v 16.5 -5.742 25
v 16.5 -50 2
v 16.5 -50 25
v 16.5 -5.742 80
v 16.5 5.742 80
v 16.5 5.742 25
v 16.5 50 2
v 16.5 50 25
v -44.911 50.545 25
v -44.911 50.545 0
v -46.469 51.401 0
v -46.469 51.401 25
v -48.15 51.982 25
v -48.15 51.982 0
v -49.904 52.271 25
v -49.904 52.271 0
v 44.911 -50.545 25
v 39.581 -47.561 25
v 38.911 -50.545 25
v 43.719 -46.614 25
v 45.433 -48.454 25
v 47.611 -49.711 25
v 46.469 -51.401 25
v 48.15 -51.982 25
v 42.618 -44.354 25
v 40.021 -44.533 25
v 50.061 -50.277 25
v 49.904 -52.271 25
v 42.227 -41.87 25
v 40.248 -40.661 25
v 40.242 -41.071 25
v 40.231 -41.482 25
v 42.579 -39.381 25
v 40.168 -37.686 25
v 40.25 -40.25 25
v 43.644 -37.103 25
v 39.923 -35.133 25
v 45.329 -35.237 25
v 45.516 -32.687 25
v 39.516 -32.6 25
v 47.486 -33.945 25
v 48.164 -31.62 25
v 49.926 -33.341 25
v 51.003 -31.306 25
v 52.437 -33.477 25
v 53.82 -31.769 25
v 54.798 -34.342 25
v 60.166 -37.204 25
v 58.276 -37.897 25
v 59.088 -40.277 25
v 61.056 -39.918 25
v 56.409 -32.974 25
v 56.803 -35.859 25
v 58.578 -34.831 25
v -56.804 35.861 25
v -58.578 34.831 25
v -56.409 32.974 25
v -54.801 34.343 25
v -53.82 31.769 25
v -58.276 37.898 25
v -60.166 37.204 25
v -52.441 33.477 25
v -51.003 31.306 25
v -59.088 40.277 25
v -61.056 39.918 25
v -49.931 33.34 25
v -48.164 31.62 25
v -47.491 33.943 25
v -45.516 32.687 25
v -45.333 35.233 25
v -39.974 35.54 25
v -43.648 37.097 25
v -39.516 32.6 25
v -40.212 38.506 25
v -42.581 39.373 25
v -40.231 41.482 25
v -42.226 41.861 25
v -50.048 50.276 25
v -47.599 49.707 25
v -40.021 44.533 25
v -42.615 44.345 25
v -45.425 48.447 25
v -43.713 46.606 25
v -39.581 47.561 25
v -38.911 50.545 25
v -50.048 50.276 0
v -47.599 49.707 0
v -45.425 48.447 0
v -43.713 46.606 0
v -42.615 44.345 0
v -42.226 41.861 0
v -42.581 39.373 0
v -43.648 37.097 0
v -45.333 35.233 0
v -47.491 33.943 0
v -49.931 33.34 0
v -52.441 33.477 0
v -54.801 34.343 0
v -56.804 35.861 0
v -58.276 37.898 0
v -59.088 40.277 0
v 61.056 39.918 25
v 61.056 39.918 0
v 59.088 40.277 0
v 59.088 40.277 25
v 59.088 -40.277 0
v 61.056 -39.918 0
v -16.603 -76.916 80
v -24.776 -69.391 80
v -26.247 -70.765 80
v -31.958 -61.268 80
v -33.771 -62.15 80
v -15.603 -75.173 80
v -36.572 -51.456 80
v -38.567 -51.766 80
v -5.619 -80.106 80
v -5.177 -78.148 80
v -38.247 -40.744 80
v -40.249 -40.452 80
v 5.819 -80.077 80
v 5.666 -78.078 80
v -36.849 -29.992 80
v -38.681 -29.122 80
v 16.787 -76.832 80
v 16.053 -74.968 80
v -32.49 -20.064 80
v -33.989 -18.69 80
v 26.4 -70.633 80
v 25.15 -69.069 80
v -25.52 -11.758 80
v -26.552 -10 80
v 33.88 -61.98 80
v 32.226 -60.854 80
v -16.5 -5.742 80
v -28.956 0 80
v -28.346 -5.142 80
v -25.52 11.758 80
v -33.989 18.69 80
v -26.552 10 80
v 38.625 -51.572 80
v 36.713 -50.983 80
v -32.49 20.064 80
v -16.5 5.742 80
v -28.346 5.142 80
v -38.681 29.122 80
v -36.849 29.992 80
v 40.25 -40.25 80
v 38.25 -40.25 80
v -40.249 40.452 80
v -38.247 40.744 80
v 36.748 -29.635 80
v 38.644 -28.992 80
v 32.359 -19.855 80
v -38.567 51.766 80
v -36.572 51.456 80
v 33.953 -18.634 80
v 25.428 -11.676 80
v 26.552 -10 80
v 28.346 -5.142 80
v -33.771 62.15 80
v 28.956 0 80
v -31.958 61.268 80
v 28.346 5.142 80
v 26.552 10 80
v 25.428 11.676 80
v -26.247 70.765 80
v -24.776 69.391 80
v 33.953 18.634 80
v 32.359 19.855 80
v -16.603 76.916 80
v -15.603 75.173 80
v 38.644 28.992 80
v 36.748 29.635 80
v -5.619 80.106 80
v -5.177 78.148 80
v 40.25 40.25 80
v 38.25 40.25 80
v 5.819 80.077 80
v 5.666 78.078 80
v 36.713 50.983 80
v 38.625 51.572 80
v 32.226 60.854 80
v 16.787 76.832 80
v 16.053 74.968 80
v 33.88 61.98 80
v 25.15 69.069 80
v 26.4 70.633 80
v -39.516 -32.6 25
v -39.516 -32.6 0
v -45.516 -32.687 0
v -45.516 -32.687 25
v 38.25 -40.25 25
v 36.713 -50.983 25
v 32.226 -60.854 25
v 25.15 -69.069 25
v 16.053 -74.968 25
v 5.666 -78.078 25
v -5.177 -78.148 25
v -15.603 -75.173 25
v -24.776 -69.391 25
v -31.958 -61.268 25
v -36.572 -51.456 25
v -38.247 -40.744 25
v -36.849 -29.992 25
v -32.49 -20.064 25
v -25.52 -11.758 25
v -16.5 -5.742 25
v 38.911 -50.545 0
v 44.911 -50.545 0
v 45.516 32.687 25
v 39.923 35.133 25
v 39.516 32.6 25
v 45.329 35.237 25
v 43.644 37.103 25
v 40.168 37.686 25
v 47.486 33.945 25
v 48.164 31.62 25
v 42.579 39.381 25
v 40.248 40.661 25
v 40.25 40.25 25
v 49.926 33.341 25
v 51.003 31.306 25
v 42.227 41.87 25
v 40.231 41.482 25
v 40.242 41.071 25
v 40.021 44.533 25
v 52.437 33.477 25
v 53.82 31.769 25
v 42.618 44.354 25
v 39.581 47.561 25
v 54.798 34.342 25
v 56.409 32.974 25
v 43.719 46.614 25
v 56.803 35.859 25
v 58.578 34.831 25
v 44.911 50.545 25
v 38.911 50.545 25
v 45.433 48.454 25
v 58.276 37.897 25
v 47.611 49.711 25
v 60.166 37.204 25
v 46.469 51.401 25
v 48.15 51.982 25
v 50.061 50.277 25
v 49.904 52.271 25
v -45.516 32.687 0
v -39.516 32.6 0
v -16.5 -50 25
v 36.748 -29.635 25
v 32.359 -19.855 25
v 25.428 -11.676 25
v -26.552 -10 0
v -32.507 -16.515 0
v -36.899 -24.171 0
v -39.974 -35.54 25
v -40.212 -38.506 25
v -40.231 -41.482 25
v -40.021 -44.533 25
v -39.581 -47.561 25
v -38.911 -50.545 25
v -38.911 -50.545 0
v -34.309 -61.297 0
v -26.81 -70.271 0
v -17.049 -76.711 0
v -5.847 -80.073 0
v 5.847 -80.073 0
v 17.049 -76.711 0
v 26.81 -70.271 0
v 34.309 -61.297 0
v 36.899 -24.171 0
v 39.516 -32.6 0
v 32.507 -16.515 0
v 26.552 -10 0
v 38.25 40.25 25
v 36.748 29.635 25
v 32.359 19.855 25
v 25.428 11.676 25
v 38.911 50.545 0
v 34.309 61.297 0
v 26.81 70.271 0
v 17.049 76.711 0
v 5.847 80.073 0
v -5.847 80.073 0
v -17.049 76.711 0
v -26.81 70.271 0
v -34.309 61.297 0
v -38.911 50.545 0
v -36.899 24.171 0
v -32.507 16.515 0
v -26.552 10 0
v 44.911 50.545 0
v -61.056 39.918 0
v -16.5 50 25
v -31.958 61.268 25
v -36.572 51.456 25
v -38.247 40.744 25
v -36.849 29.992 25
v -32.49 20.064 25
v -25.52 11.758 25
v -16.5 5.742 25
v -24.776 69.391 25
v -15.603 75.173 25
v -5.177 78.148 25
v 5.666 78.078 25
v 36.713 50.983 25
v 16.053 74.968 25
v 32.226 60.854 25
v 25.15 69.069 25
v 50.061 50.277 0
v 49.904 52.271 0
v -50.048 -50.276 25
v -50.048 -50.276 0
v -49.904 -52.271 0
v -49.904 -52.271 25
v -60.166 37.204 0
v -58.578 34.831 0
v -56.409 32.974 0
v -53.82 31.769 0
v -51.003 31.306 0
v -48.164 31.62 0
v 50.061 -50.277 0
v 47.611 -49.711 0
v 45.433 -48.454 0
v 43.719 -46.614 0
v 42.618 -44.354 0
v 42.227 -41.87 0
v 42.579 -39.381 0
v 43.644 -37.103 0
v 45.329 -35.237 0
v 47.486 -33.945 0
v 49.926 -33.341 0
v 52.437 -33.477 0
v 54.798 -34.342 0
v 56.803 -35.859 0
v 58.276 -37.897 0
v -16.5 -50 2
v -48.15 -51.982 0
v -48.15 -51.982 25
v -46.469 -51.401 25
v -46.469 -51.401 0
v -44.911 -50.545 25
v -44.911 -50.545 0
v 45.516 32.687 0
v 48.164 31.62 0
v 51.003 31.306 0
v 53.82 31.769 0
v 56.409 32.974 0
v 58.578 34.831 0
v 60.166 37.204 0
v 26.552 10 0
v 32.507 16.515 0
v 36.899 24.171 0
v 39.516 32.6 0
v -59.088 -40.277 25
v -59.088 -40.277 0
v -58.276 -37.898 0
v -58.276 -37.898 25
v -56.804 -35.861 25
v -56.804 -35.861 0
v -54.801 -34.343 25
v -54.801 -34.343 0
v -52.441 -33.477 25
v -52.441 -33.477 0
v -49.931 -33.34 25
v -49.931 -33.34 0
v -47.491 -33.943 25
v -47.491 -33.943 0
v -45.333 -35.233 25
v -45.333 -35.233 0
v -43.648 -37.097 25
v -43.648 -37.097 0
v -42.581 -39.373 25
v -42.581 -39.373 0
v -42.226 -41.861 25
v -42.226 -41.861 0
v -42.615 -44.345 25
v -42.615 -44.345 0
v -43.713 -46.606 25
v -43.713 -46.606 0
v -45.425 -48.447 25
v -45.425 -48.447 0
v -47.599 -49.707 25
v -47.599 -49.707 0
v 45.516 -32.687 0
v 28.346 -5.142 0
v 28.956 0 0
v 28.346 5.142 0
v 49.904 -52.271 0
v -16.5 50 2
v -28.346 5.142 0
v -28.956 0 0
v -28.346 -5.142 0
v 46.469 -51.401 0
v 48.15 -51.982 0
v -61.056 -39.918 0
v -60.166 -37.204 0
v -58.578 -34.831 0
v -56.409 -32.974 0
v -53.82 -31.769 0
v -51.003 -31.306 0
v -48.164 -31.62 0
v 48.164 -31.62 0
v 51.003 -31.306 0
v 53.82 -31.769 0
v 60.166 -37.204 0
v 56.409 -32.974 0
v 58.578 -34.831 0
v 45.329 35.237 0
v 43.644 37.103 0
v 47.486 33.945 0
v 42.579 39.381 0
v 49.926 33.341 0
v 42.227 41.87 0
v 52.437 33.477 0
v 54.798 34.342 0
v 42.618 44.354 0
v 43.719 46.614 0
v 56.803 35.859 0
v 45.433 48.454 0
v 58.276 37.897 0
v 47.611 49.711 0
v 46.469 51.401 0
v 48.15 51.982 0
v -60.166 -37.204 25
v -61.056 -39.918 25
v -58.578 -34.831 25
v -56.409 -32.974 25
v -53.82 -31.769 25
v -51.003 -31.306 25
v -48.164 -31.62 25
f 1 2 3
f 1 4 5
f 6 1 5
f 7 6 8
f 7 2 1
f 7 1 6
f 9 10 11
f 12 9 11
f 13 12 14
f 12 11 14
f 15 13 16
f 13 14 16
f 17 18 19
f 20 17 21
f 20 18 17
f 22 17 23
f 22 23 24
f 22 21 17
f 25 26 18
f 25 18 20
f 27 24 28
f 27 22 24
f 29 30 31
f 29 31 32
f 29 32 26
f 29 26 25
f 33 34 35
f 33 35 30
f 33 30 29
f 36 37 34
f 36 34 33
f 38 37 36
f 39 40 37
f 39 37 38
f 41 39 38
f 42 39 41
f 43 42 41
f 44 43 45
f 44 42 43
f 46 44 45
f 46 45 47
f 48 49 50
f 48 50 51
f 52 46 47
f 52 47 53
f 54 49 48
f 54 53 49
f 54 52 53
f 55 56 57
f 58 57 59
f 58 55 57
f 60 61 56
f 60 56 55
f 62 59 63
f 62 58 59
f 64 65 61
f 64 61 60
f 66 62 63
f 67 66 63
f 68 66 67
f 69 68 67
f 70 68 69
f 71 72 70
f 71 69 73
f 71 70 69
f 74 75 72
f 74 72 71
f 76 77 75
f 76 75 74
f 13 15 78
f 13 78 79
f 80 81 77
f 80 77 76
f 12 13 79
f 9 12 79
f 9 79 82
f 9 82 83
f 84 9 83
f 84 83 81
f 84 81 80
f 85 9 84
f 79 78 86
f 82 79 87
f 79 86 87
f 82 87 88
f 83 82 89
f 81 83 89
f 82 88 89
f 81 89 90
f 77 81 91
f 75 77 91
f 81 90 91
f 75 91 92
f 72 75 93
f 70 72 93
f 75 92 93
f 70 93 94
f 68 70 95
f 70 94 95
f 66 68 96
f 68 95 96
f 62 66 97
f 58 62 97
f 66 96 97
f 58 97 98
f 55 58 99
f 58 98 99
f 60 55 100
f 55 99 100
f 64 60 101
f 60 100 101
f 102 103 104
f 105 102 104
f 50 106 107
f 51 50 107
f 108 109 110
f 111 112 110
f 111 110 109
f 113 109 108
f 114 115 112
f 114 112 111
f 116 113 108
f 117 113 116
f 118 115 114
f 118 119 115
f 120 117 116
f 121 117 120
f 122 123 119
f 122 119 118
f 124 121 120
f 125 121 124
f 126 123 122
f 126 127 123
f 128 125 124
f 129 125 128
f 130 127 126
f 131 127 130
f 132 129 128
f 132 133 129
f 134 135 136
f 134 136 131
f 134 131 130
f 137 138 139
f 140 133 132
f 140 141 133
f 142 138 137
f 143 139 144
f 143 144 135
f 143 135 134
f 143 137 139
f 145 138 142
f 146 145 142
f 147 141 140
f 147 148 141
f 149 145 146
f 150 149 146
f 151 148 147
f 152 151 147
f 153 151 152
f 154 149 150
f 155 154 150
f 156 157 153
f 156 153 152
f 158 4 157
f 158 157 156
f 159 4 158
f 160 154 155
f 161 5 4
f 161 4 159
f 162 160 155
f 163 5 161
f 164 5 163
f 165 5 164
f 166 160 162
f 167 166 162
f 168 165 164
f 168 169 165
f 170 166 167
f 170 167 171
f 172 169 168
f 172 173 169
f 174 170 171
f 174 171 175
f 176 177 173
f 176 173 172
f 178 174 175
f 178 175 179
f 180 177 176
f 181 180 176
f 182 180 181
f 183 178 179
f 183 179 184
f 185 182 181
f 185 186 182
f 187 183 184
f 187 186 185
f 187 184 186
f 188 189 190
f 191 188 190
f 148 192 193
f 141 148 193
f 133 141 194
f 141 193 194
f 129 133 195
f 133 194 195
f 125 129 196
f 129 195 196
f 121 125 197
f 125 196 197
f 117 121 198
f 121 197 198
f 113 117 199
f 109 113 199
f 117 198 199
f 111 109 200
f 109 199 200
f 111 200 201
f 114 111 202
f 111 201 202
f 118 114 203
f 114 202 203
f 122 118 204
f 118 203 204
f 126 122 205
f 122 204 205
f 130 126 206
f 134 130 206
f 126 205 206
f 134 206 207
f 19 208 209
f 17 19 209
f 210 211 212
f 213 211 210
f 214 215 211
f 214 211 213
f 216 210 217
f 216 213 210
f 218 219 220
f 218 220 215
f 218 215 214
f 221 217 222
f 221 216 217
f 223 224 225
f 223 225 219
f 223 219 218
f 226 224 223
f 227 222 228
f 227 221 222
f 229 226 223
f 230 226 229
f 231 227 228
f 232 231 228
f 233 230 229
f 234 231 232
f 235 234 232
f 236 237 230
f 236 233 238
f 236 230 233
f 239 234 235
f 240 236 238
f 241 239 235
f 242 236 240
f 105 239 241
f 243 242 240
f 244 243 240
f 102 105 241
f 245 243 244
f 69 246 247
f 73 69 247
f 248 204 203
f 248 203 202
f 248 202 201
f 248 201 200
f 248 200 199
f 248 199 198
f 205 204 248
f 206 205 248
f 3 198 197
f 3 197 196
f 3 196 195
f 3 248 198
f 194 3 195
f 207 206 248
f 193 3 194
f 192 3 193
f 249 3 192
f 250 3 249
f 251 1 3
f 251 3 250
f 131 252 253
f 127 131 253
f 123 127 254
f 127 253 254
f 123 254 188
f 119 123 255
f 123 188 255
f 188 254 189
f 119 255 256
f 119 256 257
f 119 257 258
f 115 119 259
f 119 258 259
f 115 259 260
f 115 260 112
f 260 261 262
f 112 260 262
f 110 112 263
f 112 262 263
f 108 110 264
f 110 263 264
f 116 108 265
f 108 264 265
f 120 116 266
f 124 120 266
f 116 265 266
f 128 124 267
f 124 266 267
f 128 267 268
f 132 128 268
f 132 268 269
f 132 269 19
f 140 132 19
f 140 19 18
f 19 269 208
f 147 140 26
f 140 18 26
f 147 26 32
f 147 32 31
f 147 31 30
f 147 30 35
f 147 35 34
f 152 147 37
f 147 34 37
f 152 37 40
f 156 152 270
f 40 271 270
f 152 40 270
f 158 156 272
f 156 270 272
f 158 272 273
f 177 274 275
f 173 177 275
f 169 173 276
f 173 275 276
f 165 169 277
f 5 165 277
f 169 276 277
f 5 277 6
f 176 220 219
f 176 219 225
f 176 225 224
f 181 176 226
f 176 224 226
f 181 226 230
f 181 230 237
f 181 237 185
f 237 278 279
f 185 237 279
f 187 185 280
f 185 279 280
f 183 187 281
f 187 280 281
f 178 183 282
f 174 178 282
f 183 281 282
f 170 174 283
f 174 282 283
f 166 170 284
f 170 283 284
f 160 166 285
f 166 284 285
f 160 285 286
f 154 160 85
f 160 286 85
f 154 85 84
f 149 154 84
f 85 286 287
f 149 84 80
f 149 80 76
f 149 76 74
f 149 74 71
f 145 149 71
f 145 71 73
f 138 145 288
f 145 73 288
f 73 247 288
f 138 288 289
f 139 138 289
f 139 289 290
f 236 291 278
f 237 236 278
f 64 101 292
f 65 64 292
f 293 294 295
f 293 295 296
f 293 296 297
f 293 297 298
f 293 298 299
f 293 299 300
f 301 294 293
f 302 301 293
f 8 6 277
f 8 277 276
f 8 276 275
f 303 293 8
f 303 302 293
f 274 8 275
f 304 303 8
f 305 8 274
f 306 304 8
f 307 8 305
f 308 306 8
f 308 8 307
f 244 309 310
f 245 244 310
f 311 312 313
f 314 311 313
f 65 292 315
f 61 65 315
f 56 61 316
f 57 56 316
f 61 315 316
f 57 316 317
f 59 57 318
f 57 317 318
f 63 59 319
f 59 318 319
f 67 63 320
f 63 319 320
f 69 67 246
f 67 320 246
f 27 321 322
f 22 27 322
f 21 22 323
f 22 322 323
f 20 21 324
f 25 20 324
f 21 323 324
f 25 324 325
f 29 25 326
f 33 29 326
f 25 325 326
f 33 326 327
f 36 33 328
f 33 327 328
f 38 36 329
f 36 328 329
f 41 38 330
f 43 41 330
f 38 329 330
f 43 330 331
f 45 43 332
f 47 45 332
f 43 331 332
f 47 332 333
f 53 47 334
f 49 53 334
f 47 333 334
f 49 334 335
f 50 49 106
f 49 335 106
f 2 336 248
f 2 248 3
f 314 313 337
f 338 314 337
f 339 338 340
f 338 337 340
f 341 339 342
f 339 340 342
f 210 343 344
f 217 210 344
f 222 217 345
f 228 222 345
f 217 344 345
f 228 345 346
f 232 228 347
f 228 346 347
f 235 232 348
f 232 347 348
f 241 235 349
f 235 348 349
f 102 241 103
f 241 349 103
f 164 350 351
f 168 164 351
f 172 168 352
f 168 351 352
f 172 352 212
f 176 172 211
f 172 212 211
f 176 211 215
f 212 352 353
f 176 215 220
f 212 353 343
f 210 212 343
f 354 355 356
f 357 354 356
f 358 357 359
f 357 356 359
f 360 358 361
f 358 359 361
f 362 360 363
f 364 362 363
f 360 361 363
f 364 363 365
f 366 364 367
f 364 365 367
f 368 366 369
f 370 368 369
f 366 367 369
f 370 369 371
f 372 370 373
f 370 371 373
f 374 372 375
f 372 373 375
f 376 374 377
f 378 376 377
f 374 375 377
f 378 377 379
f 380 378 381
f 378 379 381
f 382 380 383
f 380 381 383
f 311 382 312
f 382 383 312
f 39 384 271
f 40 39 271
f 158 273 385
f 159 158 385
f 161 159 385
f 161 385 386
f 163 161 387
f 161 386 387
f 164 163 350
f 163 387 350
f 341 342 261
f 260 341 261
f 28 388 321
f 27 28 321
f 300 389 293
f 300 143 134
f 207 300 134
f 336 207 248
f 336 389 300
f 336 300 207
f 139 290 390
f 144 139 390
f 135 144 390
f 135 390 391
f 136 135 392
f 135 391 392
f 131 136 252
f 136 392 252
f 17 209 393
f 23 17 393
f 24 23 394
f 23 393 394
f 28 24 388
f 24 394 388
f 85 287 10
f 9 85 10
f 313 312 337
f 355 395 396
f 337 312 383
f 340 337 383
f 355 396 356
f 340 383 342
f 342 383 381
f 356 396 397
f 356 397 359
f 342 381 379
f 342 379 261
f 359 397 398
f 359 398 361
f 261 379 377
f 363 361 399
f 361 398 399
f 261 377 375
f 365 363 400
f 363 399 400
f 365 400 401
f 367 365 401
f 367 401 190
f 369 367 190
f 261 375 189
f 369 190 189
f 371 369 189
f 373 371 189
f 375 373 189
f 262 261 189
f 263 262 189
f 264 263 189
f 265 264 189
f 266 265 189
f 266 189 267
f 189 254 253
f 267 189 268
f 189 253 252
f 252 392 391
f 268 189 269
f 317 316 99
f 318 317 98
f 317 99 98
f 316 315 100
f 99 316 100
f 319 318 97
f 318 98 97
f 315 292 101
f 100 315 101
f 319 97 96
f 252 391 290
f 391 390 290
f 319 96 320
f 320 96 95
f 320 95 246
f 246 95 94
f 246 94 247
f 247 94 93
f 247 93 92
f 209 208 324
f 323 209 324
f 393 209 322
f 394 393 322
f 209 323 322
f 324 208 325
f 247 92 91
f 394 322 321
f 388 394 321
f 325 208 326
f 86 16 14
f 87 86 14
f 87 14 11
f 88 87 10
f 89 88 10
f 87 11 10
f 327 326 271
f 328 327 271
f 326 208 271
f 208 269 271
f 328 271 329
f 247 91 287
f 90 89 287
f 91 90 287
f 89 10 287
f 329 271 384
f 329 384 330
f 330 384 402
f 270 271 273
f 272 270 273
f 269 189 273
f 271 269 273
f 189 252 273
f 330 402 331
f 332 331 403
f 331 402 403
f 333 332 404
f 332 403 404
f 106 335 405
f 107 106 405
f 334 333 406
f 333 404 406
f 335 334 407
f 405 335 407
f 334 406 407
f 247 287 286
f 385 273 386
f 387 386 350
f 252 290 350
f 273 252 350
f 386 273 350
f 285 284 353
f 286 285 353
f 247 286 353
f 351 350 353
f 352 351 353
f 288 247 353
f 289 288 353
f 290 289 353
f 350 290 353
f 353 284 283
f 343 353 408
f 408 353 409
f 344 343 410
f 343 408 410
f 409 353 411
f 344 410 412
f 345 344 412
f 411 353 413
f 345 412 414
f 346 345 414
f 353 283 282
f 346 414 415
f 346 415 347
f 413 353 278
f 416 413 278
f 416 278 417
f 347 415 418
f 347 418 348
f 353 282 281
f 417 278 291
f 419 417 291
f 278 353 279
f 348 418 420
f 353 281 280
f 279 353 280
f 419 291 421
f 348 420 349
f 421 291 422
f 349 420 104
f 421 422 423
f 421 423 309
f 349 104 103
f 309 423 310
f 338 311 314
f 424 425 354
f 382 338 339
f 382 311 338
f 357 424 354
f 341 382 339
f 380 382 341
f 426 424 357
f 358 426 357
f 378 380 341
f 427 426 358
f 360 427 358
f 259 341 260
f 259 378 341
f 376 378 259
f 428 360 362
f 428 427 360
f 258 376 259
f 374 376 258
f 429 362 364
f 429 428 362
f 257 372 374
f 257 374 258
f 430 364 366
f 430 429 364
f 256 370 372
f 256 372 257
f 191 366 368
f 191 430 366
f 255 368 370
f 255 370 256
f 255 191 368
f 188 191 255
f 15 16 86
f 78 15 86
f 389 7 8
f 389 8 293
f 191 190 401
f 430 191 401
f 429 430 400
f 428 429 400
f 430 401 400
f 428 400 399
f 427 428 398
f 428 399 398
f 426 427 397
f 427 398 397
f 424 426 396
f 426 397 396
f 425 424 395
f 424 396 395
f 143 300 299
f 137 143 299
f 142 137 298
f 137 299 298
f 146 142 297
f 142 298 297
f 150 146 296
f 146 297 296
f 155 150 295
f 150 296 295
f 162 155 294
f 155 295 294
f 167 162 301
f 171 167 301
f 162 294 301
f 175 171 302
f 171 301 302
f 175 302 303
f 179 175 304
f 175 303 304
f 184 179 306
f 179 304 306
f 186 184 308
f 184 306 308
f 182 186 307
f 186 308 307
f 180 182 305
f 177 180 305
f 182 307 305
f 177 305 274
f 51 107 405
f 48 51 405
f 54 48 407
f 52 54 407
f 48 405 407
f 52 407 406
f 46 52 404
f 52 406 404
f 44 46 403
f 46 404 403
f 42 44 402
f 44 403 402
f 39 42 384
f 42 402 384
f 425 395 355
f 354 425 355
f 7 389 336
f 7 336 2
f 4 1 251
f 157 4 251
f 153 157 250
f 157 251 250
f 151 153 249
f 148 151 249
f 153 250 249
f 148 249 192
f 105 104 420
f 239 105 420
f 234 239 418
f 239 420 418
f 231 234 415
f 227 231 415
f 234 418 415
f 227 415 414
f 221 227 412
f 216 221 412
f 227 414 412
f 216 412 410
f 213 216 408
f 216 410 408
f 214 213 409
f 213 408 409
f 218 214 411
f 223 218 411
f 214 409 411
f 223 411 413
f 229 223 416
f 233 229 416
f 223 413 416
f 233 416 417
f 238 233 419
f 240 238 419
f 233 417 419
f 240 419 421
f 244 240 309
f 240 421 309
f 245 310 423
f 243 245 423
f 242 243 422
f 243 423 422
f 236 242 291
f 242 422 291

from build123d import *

# Parameters (mm, degrees)
F1_DEPTH = 80
F2_DEPTH = 25
F3_DEPTH = 27
F4_DEPTH = 2
F6_DEPTH = 25


# Not quite as in the source:
# - a feature names something its author has since deleted; it is built from what else it names


with BuildPart() as f1:
    # F0 (on Top) → F1 (new body)
    with BuildSketch(Plane.XY):
        with BuildLine():
            ThreePointArc((-16.5, 5.741848789), (-20.3953119613, 72.6088280072), (38.25, 40.25))
            ThreePointArc((38.25, 40.25), (32.3588280072, 19.8546880387), (16.5, 5.741848789))
            Line((16.5, 5.741848789), (16.5, 3.5374340314))
            ThreePointArc((16.5, 3.5374340314), (17.9795575149, 4.2389182116), (19.4293592277, 5))
            ThreePointArc((19.4293592277, 5), (23.1261233418, 7.306944295), (26.5518360947, 10))
            ThreePointArc((26.5518360947, 10), (36.6658826623, 23.6465199854), (40.25, 40.25))
            ThreePointArc((40.25, 40.25), (-16.6034800146, 76.9158826623), (-26.5518360947, 10))
            ThreePointArc((-26.5518360947, 10), (-23.1261233418, 7.306944295), (-19.4293592277, 5))
            ThreePointArc((-19.4293592277, 5), (-17.9795575149, 4.2389182116), (-16.5, 3.5374340314))
            Line((-16.5, 3.5374340314), (-16.5, 5.741848789))
        make_face()
        with BuildLine():
            Line((-19.4293592277, -5), (-19.4293592277, 5))
            ThreePointArc((-19.4293592277, 5), (-23.1261233418, 7.306944295), (-26.5518360947, 10))
            ThreePointArc((-26.5518360947, 10), (-28.9559181524, 0), (-26.5518360947, -10))
            ThreePointArc((-26.5518360947, -10), (-23.1261233418, -7.306944295), (-19.4293592277, -5))
        make_face()
        with BuildLine():
            Line((-16.5, -5.741848789), (-16.5, -3.5374340314))
            ThreePointArc((-16.5, -3.5374340314), (-17.9795575149, -4.2389182116), (-19.4293592277, -5))
            ThreePointArc((-19.4293592277, -5), (-23.1261233418, -7.306944295), (-26.5518360947, -10))
            ThreePointArc((-26.5518360947, -10), (-16.6034800146, -76.9158826623), (40.25, -40.25))
            ThreePointArc((40.25, -40.25), (36.6658826623, -23.6465199854), (26.5518360947, -10))
            ThreePointArc((26.5518360947, -10), (23.1261233418, -7.306944295), (19.4293592277, -5))
            ThreePointArc((19.4293592277, -5), (17.9795575149, -4.2389182116), (16.5, -3.5374340314))
            Line((16.5, -3.5374340314), (16.5, -5.741848789))
            ThreePointArc((16.5, -5.741848789), (32.3588280072, -19.8546880387), (38.25, -40.25))
            ThreePointArc((38.25, -40.25), (-20.3953119613, -72.6088280072), (-16.5, -5.741848789))
        make_face()
        with BuildLine():
            ThreePointArc((26.5518360947, 10), (23.1261233418, 7.306944295), (19.4293592277, 5))
            Line((19.4293592277, 5), (19.4293592277, -5))
            ThreePointArc((19.4293592277, -5), (23.1261233418, -7.306944295), (26.5518360947, -10))
            ThreePointArc((26.5518360947, -10), (28.9559181524, 0), (26.5518360947, 10))
        make_face()
        with BuildLine():
            ThreePointArc((19.4293592277, 5), (17.9795575149, 4.2389182116), (16.5, 3.5374340314))
            Line((16.5, 3.5374340314), (16.5, -3.5374340314))
            ThreePointArc((16.5, -3.5374340314), (17.9795575149, -4.2389182116), (19.4293592277, -5))
            Line((19.4293592277, -5), (19.4293592277, 5))
        make_face()
        with BuildLine():
            Line((-16.5, -3.5374340314), (-16.5, 3.5374340314))
            ThreePointArc((-16.5, 3.5374340314), (-17.9795575149, 4.2389182116), (-19.4293592277, 5))
            Line((-19.4293592277, 5), (-19.4293592277, -5))
            ThreePointArc((-19.4293592277, -5), (-17.9795575149, -4.2389182116), (-16.5, -3.5374340314))
        make_face()
    extrude(amount=F1_DEPTH)

    # F0 (on Top) → F2 (join)
    with BuildSketch(Plane.XY):
        with BuildLine():
            Line((-16.5, -50), (-16.5, -5.741848789))
            ThreePointArc((-16.5, -5.741848789), (-20.3953119613, -72.6088280072), (38.25, -40.25))
            ThreePointArc((38.25, -40.25), (32.3588280072, -19.8546880387), (16.5, -5.741848789))
            Line((16.5, -5.741848789), (16.5, -50))
            Line((16.5, -50), (-16.5, -50))
        make_face()
        with BuildLine():
            ThreePointArc((16.5, 5.741848789), (32.3588280072, 19.8546880387), (38.25, 40.25))
            ThreePointArc((38.25, 40.25), (-20.3953119613, 72.6088280072), (-16.5, 5.741848789))
            Line((-16.5, 5.741848789), (-16.5, 50))
            Line((-16.5, 50), (16.5, 50))
            Line((16.5, 50), (16.5, 5.741848789))
        make_face()
        with BuildLine():
            ThreePointArc((16.5, -5.741848789), (0, -2), (-16.5, -5.741848789))
            Line((-16.5, -5.741848789), (-16.5, -50))
            Line((-16.5, -50), (16.5, -50))
            Line((16.5, -50), (16.5, -5.741848789))
        make_face()
        with BuildLine():
            Line((-16.5, 50), (-16.5, 5.741848789))
            ThreePointArc((-16.5, 5.741848789), (0, 2), (16.5, 5.741848789))
            Line((16.5, 5.741848789), (16.5, 50))
            Line((16.5, 50), (-16.5, 50))
        make_face()
        with BuildLine():
            ThreePointArc((19.4293592277, 5), (17.9795575149, 4.2389182116), (16.5, 3.5374340314))
            Line((16.5, 3.5374340314), (16.5, -3.5374340314))
            ThreePointArc((16.5, -3.5374340314), (17.9795575149, -4.2389182116), (19.4293592277, -5))
            Line((19.4293592277, -5), (19.4293592277, 5))
        make_face()
        with BuildLine():
            Line((-16.5, -3.5374340314), (-16.5, 3.5374340314))
            ThreePointArc((-16.5, 3.5374340314), (-17.9795575149, 4.2389182116), (-19.4293592277, 5))
            Line((-19.4293592277, 5), (-19.4293592277, -5))
            ThreePointArc((-19.4293592277, -5), (-17.9795575149, -4.2389182116), (-16.5, -3.5374340314))
        make_face()
        with BuildLine():
            ThreePointArc((1.604e-07, 0), (-8.4374675441, 0.8942934069), (-16.5, 3.5374340314))
            Line((-16.5, 3.5374340314), (-16.5, -3.5374340314))
            ThreePointArc((-16.5, -3.5374340314), (-8.4374675441, -0.8942934069), (1.604e-07, 0))
        make_face()
        with BuildLine():
            ThreePointArc((16.5, 5.741848789), (0, 2), (-16.5, 5.741848789))
            Line((-16.5, 5.741848789), (-16.5, 3.5374340314))
            ThreePointArc((-16.5, 3.5374340314), (-8.4374675441, 0.8942934069), (1.604e-07, 0))
            ThreePointArc((1.604e-07, 0), (8.437467701, 0.8942934405), (16.5, 3.5374340314))
            Line((16.5, 3.5374340314), (16.5, 5.741848789))
        make_face()
        with BuildLine():
            ThreePointArc((16.5, -3.5374340314), (8.437467701, -0.8942934405), (1.604e-07, 0))
            ThreePointArc((1.604e-07, 0), (-8.4374675441, -0.8942934069), (-16.5, -3.5374340314))
            Line((-16.5, -3.5374340314), (-16.5, -5.741848789))
            ThreePointArc((-16.5, -5.741848789), (0, -2), (16.5, -5.741848789))
            Line((16.5, -5.741848789), (16.5, -3.5374340314))
        make_face()
        with BuildLine():
            Line((16.5, -3.5374340314), (16.5, 3.5374340314))
            ThreePointArc((16.5, 3.5374340314), (8.437467701, 0.8942934405), (1.604e-07, 0))
            ThreePointArc((1.604e-07, 0), (8.437467701, -0.8942934405), (16.5, -3.5374340314))
        make_face()
    extrude(amount=F2_DEPTH)

    # F0 (on Top) → F3 (cut)
    with BuildSketch(Plane.XY):
        with BuildLine():
            Line((-16.5, 50), (-16.5, 5.741848789))
            ThreePointArc((-16.5, 5.741848789), (0, 2), (16.5, 5.741848789))
            Line((16.5, 5.741848789), (16.5, 50))
            Line((16.5, 50), (-16.5, 50))
        make_face()
        with BuildLine():
            ThreePointArc((16.5, -5.741848789), (0, -2), (-16.5, -5.741848789))
            Line((-16.5, -5.741848789), (-16.5, -50))
            Line((-16.5, -50), (16.5, -50))
            Line((16.5, -50), (16.5, -5.741848789))
        make_face()
        with BuildLine():
            ThreePointArc((16.5, 5.741848789), (0, 2), (-16.5, 5.741848789))
            Line((-16.5, 5.741848789), (-16.5, 3.5374340314))
            ThreePointArc((-16.5, 3.5374340314), (-8.4374675441, 0.8942934069), (1.604e-07, 0))
            ThreePointArc((1.604e-07, 0), (8.437467701, 0.8942934405), (16.5, 3.5374340314))
            Line((16.5, 3.5374340314), (16.5, 5.741848789))
        make_face()
        with BuildLine():
            ThreePointArc((16.5, -3.5374340314), (8.437467701, -0.8942934405), (1.604e-07, 0))
            ThreePointArc((1.604e-07, 0), (-8.4374675441, -0.8942934069), (-16.5, -3.5374340314))
            Line((-16.5, -3.5374340314), (-16.5, -5.741848789))
            ThreePointArc((-16.5, -5.741848789), (0, -2), (16.5, -5.741848789))
            Line((16.5, -5.741848789), (16.5, -3.5374340314))
        make_face()
        with BuildLine():
            Line((16.5, -3.5374340314), (16.5, 3.5374340314))
            ThreePointArc((16.5, 3.5374340314), (8.437467701, 0.8942934405), (1.604e-07, 0))
            ThreePointArc((1.604e-07, 0), (8.437467701, -0.8942934405), (16.5, -3.5374340314))
        make_face()
        with BuildLine():
            ThreePointArc((1.604e-07, 0), (-8.4374675441, 0.8942934069), (-16.5, 3.5374340314))
            Line((-16.5, 3.5374340314), (-16.5, -3.5374340314))
            ThreePointArc((-16.5, -3.5374340314), (-8.4374675441, -0.8942934069), (1.604e-07, 0))
        make_face()
    extrude(amount=F3_DEPTH, mode=Mode.SUBTRACT)

    # F0 (on Top) → F4 (join)
    with BuildSketch(Plane.XY):
        with BuildLine():
            ThreePointArc((16.5, -5.741848789), (0, -2), (-16.5, -5.741848789))
            Line((-16.5, -5.741848789), (-16.5, -50))
            Line((-16.5, -50), (16.5, -50))
            Line((16.5, -50), (16.5, -5.741848789))
        make_face()
        with BuildLine():
            Line((16.5, -3.5374340314), (16.5, 3.5374340314))
            ThreePointArc((16.5, 3.5374340314), (8.437467701, 0.8942934405), (1.604e-07, 0))
            ThreePointArc((1.604e-07, 0), (8.437467701, -0.8942934405), (16.5, -3.5374340314))
        make_face()
        with BuildLine():
            ThreePointArc((16.5, -3.5374340314), (8.437467701, -0.8942934405), (1.604e-07, 0))
            ThreePointArc((1.604e-07, 0), (-8.4374675441, -0.8942934069), (-16.5, -3.5374340314))
            Line((-16.5, -3.5374340314), (-16.5, -5.741848789))
            ThreePointArc((-16.5, -5.741848789), (0, -2), (16.5, -5.741848789))
            Line((16.5, -5.741848789), (16.5, -3.5374340314))
        make_face()
        with BuildLine():
            Line((-16.5, 50), (-16.5, 5.741848789))
            ThreePointArc((-16.5, 5.741848789), (0, 2), (16.5, 5.741848789))
            Line((16.5, 5.741848789), (16.5, 50))
            Line((16.5, 50), (-16.5, 50))
        make_face()
        with BuildLine():
            ThreePointArc((1.604e-07, 0), (-8.4374675441, 0.8942934069), (-16.5, 3.5374340314))
            Line((-16.5, 3.5374340314), (-16.5, -3.5374340314))
            ThreePointArc((-16.5, -3.5374340314), (-8.4374675441, -0.8942934069), (1.604e-07, 0))
        make_face()
        with BuildLine():
            ThreePointArc((16.5, 5.741848789), (0, 2), (-16.5, 5.741848789))
            Line((-16.5, 5.741848789), (-16.5, 3.5374340314))
            ThreePointArc((-16.5, 3.5374340314), (-8.4374675441, 0.8942934069), (1.604e-07, 0))
            ThreePointArc((1.604e-07, 0), (8.437467701, 0.8942934405), (16.5, 3.5374340314))
            Line((16.5, 3.5374340314), (16.5, 5.741848789))
        make_face()
        with BuildLine():
            ThreePointArc((19.4293592277, 5), (17.9795575149, 4.2389182116), (16.5, 3.5374340314))
            Line((16.5, 3.5374340314), (16.5, -3.5374340314))
            ThreePointArc((16.5, -3.5374340314), (17.9795575149, -4.2389182116), (19.4293592277, -5))
            Line((19.4293592277, -5), (19.4293592277, 5))
        make_face()
    extrude(amount=F4_DEPTH)

    # F5 (on Top) → F6 (join)
    with BuildSketch(Plane.XY):
        with BuildLine():
            Line((50.0608983682, 50.276728797), (49.9043477191, 52.2705923566))
            ThreePointArc((49.9043477191, 52.2705923566), (47.2974067112, 51.7271782555), (44.9110131577, 50.5454142725))
            ThreePointArc((44.9110131577, 50.5454142725), (41.3964470277, 46.6199643352), (40.2311547735, 41.4815378976))
            ThreePointArc((40.2311547735, 41.4815378976), (41.7260907127, 36.3947279075), (45.5157965565, 32.6868175855))
            ThreePointArc((45.5157965565, 32.6868175855), (55.1559261055, 32.2829416087), (61.0556229863, 39.9176511802))
            Line((61.0556229863, 39.9176511802), (59.0881212036, 40.276728797))
            ThreePointArc((59.0881212036, 40.276728797), (44.416786122, 36.1071252956), (50.0608983682, 50.276728797))
        make_face()
        with BuildLine():
            ThreePointArc((45.5157965565, 32.6868175855), (41.7260907127, 36.3947279075), (40.2311547735, 41.4815378976))
            ThreePointArc((40.2311547735, 41.4815378976), (40.2452884176, 40.8658410379), (40.25, 40.25))
            ThreePointArc((40.25, 40.25), (40.0661847306, 36.4076906509), (39.5164178318, 32.6004757181))
            Line((39.5164178318, 32.6004757181), (45.5157965565, 32.6868175855))
        make_face()
        with BuildLine():
            ThreePointArc((40.2311547735, 41.4815378976), (41.3964470277, 46.6199643352), (44.9110131577, 50.5454142725))
            Line((44.9110131577, 50.5454142725), (38.9110131577, 50.5454142725))
            ThreePointArc((38.9110131577, 50.5454142725), (39.8297520698, 46.0511507526), (40.2311547735, 41.4815378976))
        make_face()
        with BuildLine():
            ThreePointArc((-40.2311547563, 41.4815384597), (-41.3964471567, 46.619964585), (-44.9110131577, 50.5454142725))
            ThreePointArc((-44.9110131577, 50.5454142725), (-47.2974067112, 51.7271782555), (-49.9043477191, 52.2705923566))
            Line((-49.9043477191, 52.2705923566), (-50.0477133056, 50.2756832334))
            ThreePointArc((-50.0477133056, 50.2756832334), (-44.4212194253, 36.102218097), (-59.0881212036, 40.276728797))
            Line((-59.0881212036, 40.276728797), (-61.0556229863, 39.9176511802))
            ThreePointArc((-61.0556229863, 39.9176511802), (-55.1559261055, 32.2829416087), (-45.5157965565, 32.6868175855))
            ThreePointArc((-45.5157965565, 32.6868175855), (-41.7260905679, 36.3947281485), (-40.2311547563, 41.4815384597))
        make_face()
        with BuildLine():
            ThreePointArc((-39.5164178318, 32.6004757181), (-40.1202835518, 37.021169295), (-40.2311547563, 41.4815384597))
            ThreePointArc((-40.2311547563, 41.4815384597), (-41.7260905679, 36.3947281485), (-45.5157965565, 32.6868175855))
            Line((-45.5157965565, 32.6868175855), (-39.5164178318, 32.6004757181))
        make_face()
        with BuildLine():
            ThreePointArc((-40.2311547563, 41.4815384597), (-39.8297520293, 46.0511510308), (-38.9110131577, 50.5454142725))
            Line((-38.9110131577, 50.5454142725), (-44.9110131577, 50.5454142725))
            ThreePointArc((-44.9110131577, 50.5454142725), (-41.3964471567, 46.619964585), (-40.2311547563, 41.4815384597))
        make_face()
        with BuildLine():
            ThreePointArc((61.0556229863, -39.9176511802), (55.1559261055, -32.2829416087), (45.5157965565, -32.6868175855))
            ThreePointArc((45.5157965565, -32.6868175855), (41.7260905575, -36.3947281657), (40.231154755, -41.4815384999))
            ThreePointArc((40.231154755, -41.4815384999), (41.3964471659, -46.6199646029), (44.9110131577, -50.5454142725))
            ThreePointArc((44.9110131577, -50.5454142725), (47.2974067112, -51.7271782555), (49.9043477191, -52.2705923566))
            Line((49.9043477191, -52.2705923566), (50.0608983682, -50.276728797))
            ThreePointArc((50.0608983682, -50.276728797), (44.416786122, -36.1071252956), (59.0881212036, -40.276728797))
            Line((59.0881212036, -40.276728797), (61.0556229863, -39.9176511802))
        make_face()
        with BuildLine():
            Line((45.5157965565, -32.6868175855), (39.5164178318, -32.6004757181))
            ThreePointArc((39.5164178318, -32.6004757181), (40.0661847306, -36.4076906509), (40.25, -40.25))
            ThreePointArc((40.25, -40.25), (40.245288413, -40.8658413392), (40.231154755, -41.4815384999))
            ThreePointArc((40.231154755, -41.4815384999), (41.7260905575, -36.3947281657), (45.5157965565, -32.6868175855))
        make_face()
        with BuildLine():
            ThreePointArc((44.9110131577, -50.5454142725), (41.3964471659, -46.6199646029), (40.231154755, -41.4815384999))
            ThreePointArc((40.231154755, -41.4815384999), (39.8297520264, -46.0511510507), (38.9110131577, -50.5454142725))
            Line((38.9110131577, -50.5454142725), (44.9110131577, -50.5454142725))
        make_face()
        with BuildLine():
            ThreePointArc((-40.2311547578, -41.481538411), (-40.1202835499, -37.0211692707), (-39.5164178318, -32.6004757181))
            Line((-39.5164178318, -32.6004757181), (-45.5157965565, -32.6868175855))
            ThreePointArc((-45.5157965565, -32.6868175855), (-41.7260905804, -36.3947281276), (-40.2311547578, -41.481538411))
        make_face()
        with BuildLine():
            ThreePointArc((-38.9110131577, -50.5454142725), (-39.8297520328, -46.0511510067), (-40.2311547578, -41.481538411))
            ThreePointArc((-40.2311547578, -41.481538411), (-41.3964471455, -46.6199645634), (-44.9110131577, -50.5454142725))
            Line((-44.9110131577, -50.5454142725), (-38.9110131577, -50.5454142725))
        make_face()
        with BuildLine():
            ThreePointArc((-40.2311547578, -41.481538411), (-41.7260905804, -36.3947281276), (-45.5157965565, -32.6868175855))
            ThreePointArc((-45.5157965565, -32.6868175855), (-55.1559261055, -32.2829416087), (-61.0556229863, -39.9176511802))
            Line((-61.0556229863, -39.9176511802), (-59.0881212036, -40.276728797))
            ThreePointArc((-59.0881212036, -40.276728797), (-44.4212194253, -36.102218097), (-50.0477133056, -50.2756832334))
            Line((-50.0477133056, -50.2756832334), (-49.9043477191, -52.2705923566))
            ThreePointArc((-49.9043477191, -52.2705923566), (-47.2974067112, -51.7271782555), (-44.9110131577, -50.5454142725))
            ThreePointArc((-44.9110131577, -50.5454142725), (-41.3964471455, -46.6199645634), (-40.2311547578, -41.481538411))
        make_face()
    extrude(amount=F6_DEPTH)


solid = f1.part
